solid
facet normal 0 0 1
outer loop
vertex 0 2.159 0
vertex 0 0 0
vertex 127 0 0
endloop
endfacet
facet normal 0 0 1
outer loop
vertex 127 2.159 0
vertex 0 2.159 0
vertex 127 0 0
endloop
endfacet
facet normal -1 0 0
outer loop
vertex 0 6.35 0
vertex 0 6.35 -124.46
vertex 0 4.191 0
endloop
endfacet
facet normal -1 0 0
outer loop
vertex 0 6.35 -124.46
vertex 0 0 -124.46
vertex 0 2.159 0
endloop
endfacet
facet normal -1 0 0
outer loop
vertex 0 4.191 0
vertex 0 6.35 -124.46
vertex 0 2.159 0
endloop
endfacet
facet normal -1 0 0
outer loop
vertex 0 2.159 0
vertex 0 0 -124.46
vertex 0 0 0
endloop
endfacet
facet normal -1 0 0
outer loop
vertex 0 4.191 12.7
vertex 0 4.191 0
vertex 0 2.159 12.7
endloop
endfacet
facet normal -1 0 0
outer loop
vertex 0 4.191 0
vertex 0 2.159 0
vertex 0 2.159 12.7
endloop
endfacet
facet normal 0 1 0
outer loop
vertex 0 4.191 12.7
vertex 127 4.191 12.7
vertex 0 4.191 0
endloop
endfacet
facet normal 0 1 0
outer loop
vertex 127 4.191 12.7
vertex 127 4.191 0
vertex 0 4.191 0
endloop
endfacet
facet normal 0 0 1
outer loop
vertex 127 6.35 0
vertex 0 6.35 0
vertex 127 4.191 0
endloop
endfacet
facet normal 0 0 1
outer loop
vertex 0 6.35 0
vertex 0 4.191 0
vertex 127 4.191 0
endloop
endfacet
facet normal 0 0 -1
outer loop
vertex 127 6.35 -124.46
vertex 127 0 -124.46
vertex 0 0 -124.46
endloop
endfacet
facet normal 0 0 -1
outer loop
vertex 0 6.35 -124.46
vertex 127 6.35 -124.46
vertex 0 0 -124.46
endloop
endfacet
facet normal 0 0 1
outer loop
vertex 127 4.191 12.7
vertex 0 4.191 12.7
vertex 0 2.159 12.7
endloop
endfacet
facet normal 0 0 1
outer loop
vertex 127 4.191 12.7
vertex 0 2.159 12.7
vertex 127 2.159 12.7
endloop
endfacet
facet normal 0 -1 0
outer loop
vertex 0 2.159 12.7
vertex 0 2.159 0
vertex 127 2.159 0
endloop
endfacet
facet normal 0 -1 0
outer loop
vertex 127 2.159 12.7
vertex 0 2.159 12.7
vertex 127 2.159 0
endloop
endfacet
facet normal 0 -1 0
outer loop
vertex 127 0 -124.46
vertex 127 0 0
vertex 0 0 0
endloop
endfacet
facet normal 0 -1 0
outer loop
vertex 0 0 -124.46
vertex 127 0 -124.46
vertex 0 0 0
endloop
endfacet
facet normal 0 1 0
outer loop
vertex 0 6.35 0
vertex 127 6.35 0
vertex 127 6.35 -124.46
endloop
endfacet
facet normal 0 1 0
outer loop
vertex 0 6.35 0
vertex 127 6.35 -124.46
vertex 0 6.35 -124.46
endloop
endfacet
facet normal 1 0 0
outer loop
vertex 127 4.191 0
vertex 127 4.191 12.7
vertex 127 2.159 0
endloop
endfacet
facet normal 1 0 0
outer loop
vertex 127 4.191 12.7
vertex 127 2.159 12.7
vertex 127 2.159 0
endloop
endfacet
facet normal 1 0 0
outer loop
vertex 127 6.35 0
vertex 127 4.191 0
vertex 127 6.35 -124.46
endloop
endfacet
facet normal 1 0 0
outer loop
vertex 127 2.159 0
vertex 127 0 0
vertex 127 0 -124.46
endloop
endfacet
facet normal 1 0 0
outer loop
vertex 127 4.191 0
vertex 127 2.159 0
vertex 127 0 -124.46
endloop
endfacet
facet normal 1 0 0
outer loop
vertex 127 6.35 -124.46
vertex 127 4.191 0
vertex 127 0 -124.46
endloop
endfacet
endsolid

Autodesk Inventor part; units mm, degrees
ref_plane "YZ Plane" through (0, 0, 0) normal (1, 0, 0) x (0, 1, 0)
ref_plane "XZ Plane" through (0, 0, 0) normal (0, 1, 0) x (-1, 0, 0)
ref_plane "XY Plane" through (0, 0, 0) normal (0, 0, 1) x (1, 0, 0)
sketch "Sketch1" plane through (0, 0, 0) normal (0, 1, 0) x (-1, 0, 0)
  line L0 (0, 0) -> (-127, 0)
  line L1 (-127, 0) -> (-127, -124.46)
  line L2 (-127, -124.46) -> (0, -124.46)
  line L3 (0, -124.46) -> (0, 0)
  dimension "d0" = 127
  dimension "d1" = 124.46
extrude "Extrusion1" add sketch "Sketch1" along normal blind 6.35
sketch "Sketch2" plane through (0, 0, 0) normal (0, 0, 1) x (1, 0, 0)
  line L0 (0, 6.35) -> (127, 6.35) construction
  line L1 (0, 6.35) -> (2.921, 6.35) construction
  line L2 (0, 0) -> (127, 0) construction
  line L3 (127, 3.429) -> (127, 2.921) construction
  line L4 (0, 6.35) -> (0, 4.191) construction
  line L5 (0, 0) -> (0, 6.35) construction
  line L6 (0, 6.35) -> (2.159, 6.35) construction
  line L7 (0, 0) -> (0, 2.159) construction
  line L8 (0, 4.191) -> (0, 2.159)
  line L9 (0, 2.159) -> (127, 2.159)
  line L10 (127, 2.159) -> (127, 4.191)
  line L11 (127, 4.191) -> (0, 4.191)
  dimension "d9" = 2.159
  dimension "d10" = 90
  dimension "d11" = 2.159
extrude "Extrusion2" add sketch "Sketch2" along normal blind 12.7
properties part number "False_Bottom_3"
